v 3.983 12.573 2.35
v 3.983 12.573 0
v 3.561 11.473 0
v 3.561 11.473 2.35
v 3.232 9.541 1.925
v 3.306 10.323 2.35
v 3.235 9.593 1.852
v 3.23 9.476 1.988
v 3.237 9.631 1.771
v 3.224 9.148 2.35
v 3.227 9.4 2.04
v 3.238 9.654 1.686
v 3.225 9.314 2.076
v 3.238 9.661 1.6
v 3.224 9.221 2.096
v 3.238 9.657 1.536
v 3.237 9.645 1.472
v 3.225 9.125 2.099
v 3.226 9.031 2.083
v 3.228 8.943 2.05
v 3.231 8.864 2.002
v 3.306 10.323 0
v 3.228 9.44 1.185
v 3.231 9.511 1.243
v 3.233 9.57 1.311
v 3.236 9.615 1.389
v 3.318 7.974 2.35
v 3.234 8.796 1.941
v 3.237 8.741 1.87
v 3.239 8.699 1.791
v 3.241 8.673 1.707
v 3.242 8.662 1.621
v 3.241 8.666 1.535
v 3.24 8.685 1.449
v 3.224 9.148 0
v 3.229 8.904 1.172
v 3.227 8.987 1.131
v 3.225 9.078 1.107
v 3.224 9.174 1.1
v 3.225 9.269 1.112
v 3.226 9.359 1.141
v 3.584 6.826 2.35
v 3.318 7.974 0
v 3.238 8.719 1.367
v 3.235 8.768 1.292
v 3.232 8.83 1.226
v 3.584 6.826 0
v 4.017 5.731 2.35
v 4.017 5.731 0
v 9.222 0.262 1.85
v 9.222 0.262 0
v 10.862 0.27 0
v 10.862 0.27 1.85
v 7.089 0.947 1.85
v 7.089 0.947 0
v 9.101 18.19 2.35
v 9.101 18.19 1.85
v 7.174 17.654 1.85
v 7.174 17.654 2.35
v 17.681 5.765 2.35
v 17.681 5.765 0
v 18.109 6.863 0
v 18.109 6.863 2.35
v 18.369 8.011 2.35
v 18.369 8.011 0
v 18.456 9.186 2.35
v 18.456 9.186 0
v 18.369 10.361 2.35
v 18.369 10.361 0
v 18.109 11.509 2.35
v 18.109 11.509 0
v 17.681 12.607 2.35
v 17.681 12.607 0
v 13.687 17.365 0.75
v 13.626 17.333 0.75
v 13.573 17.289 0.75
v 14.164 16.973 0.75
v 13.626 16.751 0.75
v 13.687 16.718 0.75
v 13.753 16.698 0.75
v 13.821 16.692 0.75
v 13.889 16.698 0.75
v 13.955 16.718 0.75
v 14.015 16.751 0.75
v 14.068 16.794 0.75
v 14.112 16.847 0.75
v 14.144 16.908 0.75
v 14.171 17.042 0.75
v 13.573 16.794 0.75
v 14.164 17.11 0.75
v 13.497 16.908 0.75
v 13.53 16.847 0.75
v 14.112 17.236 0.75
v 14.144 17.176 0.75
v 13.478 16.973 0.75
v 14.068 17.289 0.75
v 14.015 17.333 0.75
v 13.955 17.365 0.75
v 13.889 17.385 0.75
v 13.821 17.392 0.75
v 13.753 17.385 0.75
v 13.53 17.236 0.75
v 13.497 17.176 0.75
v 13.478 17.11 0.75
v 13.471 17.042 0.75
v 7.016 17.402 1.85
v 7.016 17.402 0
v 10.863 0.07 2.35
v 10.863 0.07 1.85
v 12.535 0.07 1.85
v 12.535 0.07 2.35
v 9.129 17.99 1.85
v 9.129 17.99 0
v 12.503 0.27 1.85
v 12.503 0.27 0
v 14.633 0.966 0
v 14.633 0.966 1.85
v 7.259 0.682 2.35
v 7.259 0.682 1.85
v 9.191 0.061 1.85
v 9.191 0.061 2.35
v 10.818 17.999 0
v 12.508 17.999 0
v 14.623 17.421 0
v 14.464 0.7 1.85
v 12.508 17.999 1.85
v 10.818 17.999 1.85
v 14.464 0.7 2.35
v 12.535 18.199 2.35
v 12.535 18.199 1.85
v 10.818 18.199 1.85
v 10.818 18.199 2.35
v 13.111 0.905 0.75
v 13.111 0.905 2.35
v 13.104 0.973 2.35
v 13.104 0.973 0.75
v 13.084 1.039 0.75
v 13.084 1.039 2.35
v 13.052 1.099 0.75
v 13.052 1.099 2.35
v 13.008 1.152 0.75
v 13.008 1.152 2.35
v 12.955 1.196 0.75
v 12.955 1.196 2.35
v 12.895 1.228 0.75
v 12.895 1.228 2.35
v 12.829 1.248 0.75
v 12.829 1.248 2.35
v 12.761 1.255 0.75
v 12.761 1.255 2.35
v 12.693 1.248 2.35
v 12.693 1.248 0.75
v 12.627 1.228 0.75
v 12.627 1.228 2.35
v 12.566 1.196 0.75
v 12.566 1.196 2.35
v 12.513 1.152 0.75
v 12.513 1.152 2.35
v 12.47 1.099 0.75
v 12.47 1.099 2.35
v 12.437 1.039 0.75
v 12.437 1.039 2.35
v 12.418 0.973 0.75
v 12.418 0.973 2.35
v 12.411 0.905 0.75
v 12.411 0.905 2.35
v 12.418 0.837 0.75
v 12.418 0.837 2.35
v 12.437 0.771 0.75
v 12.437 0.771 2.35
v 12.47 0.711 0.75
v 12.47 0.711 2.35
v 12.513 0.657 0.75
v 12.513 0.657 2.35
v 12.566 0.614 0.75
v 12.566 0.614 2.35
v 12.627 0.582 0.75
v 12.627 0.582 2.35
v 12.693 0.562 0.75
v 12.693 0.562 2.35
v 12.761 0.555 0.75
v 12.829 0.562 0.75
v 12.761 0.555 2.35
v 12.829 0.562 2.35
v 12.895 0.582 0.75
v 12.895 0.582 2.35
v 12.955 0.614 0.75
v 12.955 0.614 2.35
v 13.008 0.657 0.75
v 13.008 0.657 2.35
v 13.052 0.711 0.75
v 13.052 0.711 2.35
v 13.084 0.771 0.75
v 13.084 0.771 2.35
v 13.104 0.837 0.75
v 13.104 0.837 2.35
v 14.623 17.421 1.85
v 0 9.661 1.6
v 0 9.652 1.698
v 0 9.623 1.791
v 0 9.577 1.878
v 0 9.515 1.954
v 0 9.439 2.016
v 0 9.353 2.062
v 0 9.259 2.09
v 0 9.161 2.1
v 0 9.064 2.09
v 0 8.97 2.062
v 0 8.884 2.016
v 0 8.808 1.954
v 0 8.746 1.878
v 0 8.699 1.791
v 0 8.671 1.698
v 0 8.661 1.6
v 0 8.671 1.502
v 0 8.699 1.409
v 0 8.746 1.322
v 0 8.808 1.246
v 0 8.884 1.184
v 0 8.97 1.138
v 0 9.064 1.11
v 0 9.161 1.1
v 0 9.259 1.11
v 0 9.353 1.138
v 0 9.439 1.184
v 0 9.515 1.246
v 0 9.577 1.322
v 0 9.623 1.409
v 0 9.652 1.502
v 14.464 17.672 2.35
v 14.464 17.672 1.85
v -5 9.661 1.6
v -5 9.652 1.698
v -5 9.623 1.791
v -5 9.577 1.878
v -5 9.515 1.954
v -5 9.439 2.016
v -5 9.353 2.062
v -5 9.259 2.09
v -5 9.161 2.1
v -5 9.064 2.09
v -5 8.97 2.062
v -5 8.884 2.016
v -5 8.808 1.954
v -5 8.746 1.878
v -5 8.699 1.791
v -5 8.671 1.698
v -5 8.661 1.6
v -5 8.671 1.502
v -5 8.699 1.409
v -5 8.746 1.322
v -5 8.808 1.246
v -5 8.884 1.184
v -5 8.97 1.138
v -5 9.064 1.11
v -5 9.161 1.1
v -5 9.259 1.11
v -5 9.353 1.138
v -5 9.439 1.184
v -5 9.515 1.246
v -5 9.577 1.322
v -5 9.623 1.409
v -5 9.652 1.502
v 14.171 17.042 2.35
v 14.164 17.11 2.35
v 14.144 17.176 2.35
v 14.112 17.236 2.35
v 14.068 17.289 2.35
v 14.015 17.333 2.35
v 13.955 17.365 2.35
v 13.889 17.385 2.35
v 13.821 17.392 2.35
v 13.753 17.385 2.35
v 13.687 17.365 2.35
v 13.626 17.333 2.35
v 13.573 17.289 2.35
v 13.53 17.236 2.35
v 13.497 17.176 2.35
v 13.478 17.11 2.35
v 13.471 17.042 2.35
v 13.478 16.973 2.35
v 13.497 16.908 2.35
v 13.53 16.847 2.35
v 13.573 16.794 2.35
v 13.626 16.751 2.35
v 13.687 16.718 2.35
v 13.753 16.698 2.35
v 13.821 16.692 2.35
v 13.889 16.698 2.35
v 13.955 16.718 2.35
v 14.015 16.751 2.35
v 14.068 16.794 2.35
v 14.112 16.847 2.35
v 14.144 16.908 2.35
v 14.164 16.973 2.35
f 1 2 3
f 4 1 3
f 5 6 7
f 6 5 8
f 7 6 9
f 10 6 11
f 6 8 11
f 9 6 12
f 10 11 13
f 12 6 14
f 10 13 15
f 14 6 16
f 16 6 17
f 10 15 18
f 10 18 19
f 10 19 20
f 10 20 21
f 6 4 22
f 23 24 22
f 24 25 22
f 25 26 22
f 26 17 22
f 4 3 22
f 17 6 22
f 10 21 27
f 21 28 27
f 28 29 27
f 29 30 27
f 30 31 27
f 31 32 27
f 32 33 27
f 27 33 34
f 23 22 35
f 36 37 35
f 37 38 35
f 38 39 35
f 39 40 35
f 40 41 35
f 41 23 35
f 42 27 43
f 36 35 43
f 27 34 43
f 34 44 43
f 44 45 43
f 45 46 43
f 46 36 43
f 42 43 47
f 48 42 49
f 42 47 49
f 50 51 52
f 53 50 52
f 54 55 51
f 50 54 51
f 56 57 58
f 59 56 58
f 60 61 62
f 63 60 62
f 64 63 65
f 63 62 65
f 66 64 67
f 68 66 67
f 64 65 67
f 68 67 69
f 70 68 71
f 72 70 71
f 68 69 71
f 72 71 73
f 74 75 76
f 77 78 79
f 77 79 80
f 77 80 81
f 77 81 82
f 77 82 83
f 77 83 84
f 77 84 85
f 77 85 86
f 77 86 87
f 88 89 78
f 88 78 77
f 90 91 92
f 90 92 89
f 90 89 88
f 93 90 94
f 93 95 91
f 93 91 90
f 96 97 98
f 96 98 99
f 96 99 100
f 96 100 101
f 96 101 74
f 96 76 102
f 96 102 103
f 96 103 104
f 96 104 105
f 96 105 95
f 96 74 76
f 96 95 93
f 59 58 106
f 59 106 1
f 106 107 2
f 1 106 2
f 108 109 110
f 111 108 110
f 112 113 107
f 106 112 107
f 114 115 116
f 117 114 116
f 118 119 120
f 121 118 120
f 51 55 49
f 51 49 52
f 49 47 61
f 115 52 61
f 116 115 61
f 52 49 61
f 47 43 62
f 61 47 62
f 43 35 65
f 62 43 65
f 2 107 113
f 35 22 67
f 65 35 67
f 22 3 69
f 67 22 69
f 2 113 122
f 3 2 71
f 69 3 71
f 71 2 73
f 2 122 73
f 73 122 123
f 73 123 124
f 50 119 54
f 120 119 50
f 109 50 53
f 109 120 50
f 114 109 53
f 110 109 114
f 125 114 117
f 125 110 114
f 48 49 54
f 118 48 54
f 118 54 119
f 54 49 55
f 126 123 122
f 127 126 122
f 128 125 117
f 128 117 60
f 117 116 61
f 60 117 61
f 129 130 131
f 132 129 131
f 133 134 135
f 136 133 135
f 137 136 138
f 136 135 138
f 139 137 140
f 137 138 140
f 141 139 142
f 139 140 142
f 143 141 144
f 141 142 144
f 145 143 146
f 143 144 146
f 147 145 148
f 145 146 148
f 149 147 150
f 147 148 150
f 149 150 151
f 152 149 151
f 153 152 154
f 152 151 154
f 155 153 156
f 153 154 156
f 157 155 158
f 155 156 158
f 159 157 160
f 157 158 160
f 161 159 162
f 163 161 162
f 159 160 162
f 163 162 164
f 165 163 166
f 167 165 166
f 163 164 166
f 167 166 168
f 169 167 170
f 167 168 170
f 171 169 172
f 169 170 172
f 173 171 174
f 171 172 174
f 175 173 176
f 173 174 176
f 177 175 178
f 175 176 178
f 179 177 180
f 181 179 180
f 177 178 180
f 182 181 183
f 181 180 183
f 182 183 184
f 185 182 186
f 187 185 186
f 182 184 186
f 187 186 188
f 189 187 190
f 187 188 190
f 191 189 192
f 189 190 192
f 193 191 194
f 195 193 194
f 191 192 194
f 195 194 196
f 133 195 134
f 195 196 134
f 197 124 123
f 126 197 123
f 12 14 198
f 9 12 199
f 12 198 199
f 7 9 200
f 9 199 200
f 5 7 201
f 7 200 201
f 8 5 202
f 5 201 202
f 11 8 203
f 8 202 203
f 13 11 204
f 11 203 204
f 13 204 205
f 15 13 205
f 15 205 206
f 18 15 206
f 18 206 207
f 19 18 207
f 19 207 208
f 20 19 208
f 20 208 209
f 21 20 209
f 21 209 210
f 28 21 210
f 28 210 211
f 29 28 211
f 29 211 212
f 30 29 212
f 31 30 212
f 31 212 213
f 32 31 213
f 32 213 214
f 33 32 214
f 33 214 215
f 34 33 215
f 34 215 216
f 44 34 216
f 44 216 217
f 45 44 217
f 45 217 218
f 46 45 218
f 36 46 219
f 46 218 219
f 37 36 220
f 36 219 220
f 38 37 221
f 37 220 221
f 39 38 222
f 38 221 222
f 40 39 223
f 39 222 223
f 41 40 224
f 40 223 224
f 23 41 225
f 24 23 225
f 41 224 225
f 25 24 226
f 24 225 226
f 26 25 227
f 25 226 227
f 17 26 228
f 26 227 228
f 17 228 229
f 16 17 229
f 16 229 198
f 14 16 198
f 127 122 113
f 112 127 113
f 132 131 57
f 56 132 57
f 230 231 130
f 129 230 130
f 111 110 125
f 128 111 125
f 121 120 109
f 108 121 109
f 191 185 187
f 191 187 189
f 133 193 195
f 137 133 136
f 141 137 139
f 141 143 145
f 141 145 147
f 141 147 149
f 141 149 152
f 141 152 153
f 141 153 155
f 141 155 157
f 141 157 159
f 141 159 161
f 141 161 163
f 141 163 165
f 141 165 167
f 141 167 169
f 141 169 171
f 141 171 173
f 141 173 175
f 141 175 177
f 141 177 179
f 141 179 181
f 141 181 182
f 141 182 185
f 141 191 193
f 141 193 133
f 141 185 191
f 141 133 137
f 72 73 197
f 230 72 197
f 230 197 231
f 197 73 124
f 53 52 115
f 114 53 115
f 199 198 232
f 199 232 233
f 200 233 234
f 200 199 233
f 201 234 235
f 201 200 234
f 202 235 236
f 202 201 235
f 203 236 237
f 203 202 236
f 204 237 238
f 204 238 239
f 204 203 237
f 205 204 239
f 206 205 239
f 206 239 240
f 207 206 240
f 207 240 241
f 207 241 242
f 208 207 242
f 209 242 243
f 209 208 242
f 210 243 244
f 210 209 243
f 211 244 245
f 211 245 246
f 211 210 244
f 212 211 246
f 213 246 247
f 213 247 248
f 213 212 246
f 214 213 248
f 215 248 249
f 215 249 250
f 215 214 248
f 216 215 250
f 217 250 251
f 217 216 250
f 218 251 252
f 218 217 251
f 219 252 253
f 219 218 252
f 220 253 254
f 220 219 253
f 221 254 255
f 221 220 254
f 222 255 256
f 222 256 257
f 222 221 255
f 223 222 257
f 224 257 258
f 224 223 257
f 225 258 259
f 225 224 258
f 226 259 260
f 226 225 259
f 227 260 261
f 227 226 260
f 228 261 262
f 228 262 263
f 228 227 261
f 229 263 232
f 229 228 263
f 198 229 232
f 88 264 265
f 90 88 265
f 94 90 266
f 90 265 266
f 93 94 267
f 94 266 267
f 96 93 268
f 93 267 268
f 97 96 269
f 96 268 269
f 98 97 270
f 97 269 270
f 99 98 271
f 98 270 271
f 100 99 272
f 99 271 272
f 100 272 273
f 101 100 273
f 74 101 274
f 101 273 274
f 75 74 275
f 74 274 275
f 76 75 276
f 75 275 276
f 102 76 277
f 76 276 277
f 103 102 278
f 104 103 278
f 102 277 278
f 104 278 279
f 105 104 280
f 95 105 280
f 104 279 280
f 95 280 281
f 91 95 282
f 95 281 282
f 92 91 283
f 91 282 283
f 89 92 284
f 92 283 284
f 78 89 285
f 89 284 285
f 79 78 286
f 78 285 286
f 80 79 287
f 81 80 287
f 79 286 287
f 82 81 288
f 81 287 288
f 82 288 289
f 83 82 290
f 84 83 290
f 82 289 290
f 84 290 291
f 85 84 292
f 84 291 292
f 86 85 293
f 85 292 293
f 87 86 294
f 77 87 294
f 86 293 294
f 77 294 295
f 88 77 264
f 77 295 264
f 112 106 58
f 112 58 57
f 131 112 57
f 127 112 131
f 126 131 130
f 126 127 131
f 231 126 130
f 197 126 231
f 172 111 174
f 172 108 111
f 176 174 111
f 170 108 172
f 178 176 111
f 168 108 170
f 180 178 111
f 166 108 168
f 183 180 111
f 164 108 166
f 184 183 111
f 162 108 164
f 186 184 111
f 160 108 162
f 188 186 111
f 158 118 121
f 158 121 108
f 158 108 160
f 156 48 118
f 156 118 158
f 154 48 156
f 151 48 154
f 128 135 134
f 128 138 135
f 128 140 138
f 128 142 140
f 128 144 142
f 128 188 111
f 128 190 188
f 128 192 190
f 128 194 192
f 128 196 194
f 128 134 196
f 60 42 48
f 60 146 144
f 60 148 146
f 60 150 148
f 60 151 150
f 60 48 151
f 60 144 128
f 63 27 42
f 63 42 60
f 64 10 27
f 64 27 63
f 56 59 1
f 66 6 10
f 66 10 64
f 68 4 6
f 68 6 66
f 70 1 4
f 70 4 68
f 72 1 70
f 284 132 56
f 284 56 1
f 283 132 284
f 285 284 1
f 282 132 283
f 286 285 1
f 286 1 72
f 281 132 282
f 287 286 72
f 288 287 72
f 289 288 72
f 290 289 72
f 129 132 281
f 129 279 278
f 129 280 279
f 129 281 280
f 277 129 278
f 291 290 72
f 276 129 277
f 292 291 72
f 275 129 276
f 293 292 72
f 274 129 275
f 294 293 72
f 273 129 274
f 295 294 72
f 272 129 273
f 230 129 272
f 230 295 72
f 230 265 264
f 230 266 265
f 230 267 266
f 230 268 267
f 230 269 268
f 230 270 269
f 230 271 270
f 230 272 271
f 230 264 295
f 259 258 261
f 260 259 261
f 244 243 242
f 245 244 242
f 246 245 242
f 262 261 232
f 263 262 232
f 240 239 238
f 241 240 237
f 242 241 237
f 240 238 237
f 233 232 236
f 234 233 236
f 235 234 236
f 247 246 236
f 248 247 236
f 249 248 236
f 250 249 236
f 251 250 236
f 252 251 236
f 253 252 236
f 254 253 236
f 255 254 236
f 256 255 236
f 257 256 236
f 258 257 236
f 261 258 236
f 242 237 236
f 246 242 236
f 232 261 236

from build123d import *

# Parameters (mm, degrees)
F1_DEPTH      = 2.35
F2_R          = 0.5
F3_DEPTH      = 5
F3_DEPTH_BACK = 5
F5_DEPTH      = 1.85
F6_R          = 0.35
F7_DEPTH      = 1.6


with BuildPart() as f1:
    # F0 (on Top) → F1 (new body)
    with BuildSketch(Plane.XY):
        with BuildLine():
            Line((12.5348381698, 18.1987490505), (10.8179235831, 18.1987490505))
            Line((10.8179235831, 18.1987490505), (9.1010301327, 18.1902297699))
            Line((9.1010301327, 18.1902297699), (7.1743787806, 17.653559883))
            Line((7.1743787806, 17.653559883), (3.98264217, 12.5729282876))
            ThreePointArc((3.98264217, 12.5729282876), (3.2243689245, 9.1481475257), (4.0165917388, 5.7310603752))
            Line((4.0165917388, 5.7310603752), (7.2585904547, 0.6823531817))
            Line((7.2585904547, 0.6823531817), (9.1909860265, 0.0613885547))
            Line((9.1909860265, 0.0613885547), (10.8629018068, 0.0696846546))
            Line((10.8629018068, 0.0696846546), (12.5348381698, 0.0696846546))
            Line((12.5348381698, 0.0696846546), (14.464128744, 0.7002301281))
            Line((14.464128744, 0.7002301281), (17.6810360095, 5.7649618728))
            ThreePointArc((17.6810360095, 5.7649618728), (18.4562935833, 9.1859379434), (17.6810360095, 12.606914014))
            Line((17.6810360095, 12.606914014), (14.464128744, 17.6716457586))
            Line((14.464128744, 17.6716457586), (12.5348381698, 18.1987490505))
        make_face()
    extrude(amount=F1_DEPTH)

    # F2 (on Right) → F3 (join, two sides)
    with BuildSketch(Plane.YZ) as f3_sk:
        with Locations((9.1614143501, 1.6)):
            Circle(F2_R)
    extrude(amount=F3_DEPTH)
    extrude(f3_sk.sketch, amount=-F3_DEPTH_BACK)

    # F4 (on face) → F5 (cut)
    with BuildSketch(Plane(origin=(0, 0, 0), x_dir=(1, 0, 0), z_dir=(0, 0, -1))):
        Polygon((7.2585904547, -0.6823531817), (7.0886202668, -0.9470447456), (9.2218469568, -0.2615441498), (10.8624056067, -0.2696846546), (12.5029844531, -0.2696846546), (14.6327834476, -0.9657618207), (14.464128744, -0.7002301281), (12.5348381698, -0.0696846546), (10.8629018068, -0.0696846546), (9.1909860265, -0.0613885547), align=None)
        Polygon((9.1288516348, -17.9903653589), (7.0162878227, -17.401909445), (7.1743787806, -17.653559883), (9.1010301327, -18.1902297699), (10.8179235831, -18.1987490505), (12.5348381698, -18.1987490505), (14.464128744, -17.6716457586), (14.623466438, -17.4207828614), (12.5080087317, -17.9987490505), (10.8184197833, -17.9987490505), align=None)
    extrude(amount=-F5_DEPTH, mode=Mode.SUBTRACT)

    # F6 (on face) → F7 (cut)
    with BuildSketch(Plane.XY.offset(2.35)):
        with Locations((12.7608353453, 0.9049560811)):
            Circle(F6_R)
        with Locations((13.8208036158, 17.0416355185)):
            Circle(F6_R)
    extrude(amount=-F7_DEPTH, mode=Mode.SUBTRACT)


solid = f1.part
